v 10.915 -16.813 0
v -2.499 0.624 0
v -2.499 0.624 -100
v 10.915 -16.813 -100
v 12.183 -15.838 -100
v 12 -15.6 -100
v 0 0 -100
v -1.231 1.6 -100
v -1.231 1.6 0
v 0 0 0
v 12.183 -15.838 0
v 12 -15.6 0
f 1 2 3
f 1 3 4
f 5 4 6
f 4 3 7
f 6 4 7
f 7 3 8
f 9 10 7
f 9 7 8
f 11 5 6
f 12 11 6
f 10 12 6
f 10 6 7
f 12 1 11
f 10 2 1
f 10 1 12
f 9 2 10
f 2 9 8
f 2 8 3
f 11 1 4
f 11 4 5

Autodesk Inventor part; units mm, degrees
ref_plane "YZ Plane" through (0, 0, 0) normal (1, 0, 0) x (0, 1, 0)
ref_plane "XZ Plane" through (0, 0, 0) normal (0, 1, 0) x (-1, 0, 0)
sketch "Sketch2" plane through (0, 0, 0) normal (0, 0, 1) x (1, 0, 0)
  line L0 (12.1829, -15.8377) -> (-1.2308, 1.6)
  line L1 (-1.2308, 1.6) -> (-2.499, 0.6245)
  line L2 (-2.499, 0.6245) -> (10.9147, -16.8133)
  line L3 (10.9147, -16.8133) -> (12.1829, -15.8377)
  line L4 (12, -15.6) -> (100, -15.6) projected
  line L5 (100, -15.6) -> (100, -14) projected
  line L6 (12, -14) -> (100, -14) projected
  line L7 (12, -15.6) -> (12, -14) projected
  line L8 (0, 0) -> (100, 0) projected
  line L9 (100, 0) -> (100, 1.6) projected
  line L10 (0, 1.6) -> (100, 1.6) projected
  line L11 (0, 0) -> (0, 1.6) projected
  dimension "d0" = 1.6
  dimension "d1" = 22
ref_plane "Work Plane1" through (15, -19.5, -83) normal (0, 0, -1) x (0, 1, 0)
extrude "Extrusion1" add sketch "Sketch2" against normal blind 100 contours L3 L2 L1 L0
